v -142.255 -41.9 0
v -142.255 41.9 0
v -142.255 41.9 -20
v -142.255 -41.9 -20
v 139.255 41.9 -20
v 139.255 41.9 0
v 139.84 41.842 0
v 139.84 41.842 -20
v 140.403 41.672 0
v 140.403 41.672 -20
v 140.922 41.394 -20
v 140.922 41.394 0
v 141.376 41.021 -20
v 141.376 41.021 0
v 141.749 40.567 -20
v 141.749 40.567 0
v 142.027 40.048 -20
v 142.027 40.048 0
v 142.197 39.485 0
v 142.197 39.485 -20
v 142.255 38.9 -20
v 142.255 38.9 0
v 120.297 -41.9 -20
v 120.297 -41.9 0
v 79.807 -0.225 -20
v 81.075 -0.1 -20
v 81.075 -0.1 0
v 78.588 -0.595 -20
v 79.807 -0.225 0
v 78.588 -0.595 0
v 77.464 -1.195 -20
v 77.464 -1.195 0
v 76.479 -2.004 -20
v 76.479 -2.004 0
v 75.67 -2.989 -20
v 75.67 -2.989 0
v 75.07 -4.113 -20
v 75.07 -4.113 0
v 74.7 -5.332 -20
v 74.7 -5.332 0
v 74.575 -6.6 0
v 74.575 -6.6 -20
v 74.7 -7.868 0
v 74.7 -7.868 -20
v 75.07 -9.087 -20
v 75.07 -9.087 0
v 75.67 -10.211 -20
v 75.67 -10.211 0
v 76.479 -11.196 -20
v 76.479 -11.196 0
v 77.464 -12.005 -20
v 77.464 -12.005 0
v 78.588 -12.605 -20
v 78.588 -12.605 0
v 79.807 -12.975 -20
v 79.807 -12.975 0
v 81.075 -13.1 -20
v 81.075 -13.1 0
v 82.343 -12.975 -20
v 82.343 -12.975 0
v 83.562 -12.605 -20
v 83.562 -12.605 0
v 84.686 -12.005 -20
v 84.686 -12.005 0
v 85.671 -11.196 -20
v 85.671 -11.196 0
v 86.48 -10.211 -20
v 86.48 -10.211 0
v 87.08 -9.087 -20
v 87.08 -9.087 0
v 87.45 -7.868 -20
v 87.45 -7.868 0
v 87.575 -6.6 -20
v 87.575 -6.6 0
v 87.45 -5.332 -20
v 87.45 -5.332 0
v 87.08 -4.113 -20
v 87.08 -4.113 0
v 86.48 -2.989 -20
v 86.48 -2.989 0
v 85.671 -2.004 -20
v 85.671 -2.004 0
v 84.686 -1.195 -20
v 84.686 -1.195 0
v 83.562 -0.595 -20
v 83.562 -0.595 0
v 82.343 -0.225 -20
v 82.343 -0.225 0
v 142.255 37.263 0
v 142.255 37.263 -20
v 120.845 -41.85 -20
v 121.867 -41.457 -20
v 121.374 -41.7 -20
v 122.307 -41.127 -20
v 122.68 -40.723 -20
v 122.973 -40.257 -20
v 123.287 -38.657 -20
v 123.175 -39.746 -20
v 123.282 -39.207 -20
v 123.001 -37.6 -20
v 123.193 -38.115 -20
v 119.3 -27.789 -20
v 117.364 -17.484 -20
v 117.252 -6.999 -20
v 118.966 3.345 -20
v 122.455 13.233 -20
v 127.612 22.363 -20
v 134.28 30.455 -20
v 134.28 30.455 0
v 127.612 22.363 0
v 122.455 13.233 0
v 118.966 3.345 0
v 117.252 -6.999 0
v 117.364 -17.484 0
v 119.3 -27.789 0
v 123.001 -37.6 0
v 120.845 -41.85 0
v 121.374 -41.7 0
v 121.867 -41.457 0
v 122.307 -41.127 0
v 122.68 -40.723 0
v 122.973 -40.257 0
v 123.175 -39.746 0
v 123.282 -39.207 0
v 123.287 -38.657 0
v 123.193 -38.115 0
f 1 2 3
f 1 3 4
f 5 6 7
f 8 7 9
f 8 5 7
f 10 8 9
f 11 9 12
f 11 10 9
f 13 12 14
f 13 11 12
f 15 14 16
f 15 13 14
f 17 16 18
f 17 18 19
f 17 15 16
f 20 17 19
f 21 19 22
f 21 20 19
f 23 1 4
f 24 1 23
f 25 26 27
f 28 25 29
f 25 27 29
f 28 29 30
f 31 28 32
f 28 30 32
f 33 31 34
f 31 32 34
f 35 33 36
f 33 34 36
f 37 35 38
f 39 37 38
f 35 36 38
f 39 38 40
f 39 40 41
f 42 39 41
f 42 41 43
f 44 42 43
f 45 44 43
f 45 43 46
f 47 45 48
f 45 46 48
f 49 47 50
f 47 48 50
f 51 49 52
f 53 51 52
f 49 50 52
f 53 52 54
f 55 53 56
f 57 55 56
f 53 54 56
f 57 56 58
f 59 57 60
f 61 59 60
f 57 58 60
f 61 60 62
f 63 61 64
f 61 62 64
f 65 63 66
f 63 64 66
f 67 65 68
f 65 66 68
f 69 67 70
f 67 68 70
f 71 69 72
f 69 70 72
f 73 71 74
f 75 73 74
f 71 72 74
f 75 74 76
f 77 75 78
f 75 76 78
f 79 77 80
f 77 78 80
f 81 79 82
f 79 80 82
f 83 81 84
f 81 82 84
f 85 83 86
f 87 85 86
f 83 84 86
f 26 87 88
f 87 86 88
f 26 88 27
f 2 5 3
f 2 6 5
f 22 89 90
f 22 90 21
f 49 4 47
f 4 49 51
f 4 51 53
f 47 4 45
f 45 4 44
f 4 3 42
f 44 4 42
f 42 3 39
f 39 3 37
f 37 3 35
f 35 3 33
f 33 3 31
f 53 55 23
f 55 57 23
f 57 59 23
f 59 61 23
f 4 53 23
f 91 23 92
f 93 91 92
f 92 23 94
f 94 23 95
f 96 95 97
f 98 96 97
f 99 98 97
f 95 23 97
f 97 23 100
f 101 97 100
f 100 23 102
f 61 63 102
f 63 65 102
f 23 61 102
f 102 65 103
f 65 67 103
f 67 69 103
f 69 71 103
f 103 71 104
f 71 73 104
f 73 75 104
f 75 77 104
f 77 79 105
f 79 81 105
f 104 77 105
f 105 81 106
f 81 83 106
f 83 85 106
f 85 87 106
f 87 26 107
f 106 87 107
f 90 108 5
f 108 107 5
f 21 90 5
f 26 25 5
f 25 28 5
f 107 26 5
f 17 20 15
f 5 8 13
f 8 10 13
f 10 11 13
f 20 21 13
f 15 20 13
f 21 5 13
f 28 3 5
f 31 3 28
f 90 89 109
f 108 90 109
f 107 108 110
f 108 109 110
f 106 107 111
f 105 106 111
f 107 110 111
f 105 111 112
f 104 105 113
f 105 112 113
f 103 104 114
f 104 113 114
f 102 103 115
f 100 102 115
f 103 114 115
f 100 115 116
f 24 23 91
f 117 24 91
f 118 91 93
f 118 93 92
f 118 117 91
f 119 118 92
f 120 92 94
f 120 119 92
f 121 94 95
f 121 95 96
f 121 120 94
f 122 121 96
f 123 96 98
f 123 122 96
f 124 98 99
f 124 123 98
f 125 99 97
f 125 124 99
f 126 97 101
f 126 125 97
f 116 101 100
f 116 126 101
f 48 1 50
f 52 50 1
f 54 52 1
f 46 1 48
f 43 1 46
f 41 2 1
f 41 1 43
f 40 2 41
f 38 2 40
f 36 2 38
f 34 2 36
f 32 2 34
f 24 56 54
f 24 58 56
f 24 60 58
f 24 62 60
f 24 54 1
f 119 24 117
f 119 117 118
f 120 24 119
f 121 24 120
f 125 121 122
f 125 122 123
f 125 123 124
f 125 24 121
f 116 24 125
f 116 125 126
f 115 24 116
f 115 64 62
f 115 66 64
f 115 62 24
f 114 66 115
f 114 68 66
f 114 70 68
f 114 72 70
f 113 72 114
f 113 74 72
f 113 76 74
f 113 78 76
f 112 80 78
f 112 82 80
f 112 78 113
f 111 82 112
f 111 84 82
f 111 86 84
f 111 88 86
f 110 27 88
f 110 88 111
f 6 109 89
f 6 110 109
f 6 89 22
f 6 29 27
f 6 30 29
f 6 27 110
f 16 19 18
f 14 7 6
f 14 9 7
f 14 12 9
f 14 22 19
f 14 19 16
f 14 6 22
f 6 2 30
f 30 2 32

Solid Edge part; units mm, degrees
sketch "Sketch1" plane through (0, 0, 0) normal (0, 0, 1) x (1, 0, 0)
  line L0 (-142.255, -41.9) -> (142.255, -41.9)
  line L1 (142.255, -41.9) -> (142.255, 41.9)
  line L2 (142.255, 41.9) -> (-142.255, 41.9)
  line L3 (-142.255, 41.9) -> (-142.255, -41.9)
extrude "Protrusion1" add sketch "Sketch1" against normal blind 20
sketch "Sketch2" plane through (0, 0, 0) normal (0, 0, 1) x (0, 1, 0)
  circle A0 centre (-6.6, -81.075) radius 6.5
  circle A1 centre (-11.6, -177.075) radius 60
extrude "ExtrudedCutout_1" cut sketch "Sketch2" against normal blind 20
fillet "Round_1" radius 3 2 edges at (125.2878, -41.9, -10) (142.255, 41.9, -10)
